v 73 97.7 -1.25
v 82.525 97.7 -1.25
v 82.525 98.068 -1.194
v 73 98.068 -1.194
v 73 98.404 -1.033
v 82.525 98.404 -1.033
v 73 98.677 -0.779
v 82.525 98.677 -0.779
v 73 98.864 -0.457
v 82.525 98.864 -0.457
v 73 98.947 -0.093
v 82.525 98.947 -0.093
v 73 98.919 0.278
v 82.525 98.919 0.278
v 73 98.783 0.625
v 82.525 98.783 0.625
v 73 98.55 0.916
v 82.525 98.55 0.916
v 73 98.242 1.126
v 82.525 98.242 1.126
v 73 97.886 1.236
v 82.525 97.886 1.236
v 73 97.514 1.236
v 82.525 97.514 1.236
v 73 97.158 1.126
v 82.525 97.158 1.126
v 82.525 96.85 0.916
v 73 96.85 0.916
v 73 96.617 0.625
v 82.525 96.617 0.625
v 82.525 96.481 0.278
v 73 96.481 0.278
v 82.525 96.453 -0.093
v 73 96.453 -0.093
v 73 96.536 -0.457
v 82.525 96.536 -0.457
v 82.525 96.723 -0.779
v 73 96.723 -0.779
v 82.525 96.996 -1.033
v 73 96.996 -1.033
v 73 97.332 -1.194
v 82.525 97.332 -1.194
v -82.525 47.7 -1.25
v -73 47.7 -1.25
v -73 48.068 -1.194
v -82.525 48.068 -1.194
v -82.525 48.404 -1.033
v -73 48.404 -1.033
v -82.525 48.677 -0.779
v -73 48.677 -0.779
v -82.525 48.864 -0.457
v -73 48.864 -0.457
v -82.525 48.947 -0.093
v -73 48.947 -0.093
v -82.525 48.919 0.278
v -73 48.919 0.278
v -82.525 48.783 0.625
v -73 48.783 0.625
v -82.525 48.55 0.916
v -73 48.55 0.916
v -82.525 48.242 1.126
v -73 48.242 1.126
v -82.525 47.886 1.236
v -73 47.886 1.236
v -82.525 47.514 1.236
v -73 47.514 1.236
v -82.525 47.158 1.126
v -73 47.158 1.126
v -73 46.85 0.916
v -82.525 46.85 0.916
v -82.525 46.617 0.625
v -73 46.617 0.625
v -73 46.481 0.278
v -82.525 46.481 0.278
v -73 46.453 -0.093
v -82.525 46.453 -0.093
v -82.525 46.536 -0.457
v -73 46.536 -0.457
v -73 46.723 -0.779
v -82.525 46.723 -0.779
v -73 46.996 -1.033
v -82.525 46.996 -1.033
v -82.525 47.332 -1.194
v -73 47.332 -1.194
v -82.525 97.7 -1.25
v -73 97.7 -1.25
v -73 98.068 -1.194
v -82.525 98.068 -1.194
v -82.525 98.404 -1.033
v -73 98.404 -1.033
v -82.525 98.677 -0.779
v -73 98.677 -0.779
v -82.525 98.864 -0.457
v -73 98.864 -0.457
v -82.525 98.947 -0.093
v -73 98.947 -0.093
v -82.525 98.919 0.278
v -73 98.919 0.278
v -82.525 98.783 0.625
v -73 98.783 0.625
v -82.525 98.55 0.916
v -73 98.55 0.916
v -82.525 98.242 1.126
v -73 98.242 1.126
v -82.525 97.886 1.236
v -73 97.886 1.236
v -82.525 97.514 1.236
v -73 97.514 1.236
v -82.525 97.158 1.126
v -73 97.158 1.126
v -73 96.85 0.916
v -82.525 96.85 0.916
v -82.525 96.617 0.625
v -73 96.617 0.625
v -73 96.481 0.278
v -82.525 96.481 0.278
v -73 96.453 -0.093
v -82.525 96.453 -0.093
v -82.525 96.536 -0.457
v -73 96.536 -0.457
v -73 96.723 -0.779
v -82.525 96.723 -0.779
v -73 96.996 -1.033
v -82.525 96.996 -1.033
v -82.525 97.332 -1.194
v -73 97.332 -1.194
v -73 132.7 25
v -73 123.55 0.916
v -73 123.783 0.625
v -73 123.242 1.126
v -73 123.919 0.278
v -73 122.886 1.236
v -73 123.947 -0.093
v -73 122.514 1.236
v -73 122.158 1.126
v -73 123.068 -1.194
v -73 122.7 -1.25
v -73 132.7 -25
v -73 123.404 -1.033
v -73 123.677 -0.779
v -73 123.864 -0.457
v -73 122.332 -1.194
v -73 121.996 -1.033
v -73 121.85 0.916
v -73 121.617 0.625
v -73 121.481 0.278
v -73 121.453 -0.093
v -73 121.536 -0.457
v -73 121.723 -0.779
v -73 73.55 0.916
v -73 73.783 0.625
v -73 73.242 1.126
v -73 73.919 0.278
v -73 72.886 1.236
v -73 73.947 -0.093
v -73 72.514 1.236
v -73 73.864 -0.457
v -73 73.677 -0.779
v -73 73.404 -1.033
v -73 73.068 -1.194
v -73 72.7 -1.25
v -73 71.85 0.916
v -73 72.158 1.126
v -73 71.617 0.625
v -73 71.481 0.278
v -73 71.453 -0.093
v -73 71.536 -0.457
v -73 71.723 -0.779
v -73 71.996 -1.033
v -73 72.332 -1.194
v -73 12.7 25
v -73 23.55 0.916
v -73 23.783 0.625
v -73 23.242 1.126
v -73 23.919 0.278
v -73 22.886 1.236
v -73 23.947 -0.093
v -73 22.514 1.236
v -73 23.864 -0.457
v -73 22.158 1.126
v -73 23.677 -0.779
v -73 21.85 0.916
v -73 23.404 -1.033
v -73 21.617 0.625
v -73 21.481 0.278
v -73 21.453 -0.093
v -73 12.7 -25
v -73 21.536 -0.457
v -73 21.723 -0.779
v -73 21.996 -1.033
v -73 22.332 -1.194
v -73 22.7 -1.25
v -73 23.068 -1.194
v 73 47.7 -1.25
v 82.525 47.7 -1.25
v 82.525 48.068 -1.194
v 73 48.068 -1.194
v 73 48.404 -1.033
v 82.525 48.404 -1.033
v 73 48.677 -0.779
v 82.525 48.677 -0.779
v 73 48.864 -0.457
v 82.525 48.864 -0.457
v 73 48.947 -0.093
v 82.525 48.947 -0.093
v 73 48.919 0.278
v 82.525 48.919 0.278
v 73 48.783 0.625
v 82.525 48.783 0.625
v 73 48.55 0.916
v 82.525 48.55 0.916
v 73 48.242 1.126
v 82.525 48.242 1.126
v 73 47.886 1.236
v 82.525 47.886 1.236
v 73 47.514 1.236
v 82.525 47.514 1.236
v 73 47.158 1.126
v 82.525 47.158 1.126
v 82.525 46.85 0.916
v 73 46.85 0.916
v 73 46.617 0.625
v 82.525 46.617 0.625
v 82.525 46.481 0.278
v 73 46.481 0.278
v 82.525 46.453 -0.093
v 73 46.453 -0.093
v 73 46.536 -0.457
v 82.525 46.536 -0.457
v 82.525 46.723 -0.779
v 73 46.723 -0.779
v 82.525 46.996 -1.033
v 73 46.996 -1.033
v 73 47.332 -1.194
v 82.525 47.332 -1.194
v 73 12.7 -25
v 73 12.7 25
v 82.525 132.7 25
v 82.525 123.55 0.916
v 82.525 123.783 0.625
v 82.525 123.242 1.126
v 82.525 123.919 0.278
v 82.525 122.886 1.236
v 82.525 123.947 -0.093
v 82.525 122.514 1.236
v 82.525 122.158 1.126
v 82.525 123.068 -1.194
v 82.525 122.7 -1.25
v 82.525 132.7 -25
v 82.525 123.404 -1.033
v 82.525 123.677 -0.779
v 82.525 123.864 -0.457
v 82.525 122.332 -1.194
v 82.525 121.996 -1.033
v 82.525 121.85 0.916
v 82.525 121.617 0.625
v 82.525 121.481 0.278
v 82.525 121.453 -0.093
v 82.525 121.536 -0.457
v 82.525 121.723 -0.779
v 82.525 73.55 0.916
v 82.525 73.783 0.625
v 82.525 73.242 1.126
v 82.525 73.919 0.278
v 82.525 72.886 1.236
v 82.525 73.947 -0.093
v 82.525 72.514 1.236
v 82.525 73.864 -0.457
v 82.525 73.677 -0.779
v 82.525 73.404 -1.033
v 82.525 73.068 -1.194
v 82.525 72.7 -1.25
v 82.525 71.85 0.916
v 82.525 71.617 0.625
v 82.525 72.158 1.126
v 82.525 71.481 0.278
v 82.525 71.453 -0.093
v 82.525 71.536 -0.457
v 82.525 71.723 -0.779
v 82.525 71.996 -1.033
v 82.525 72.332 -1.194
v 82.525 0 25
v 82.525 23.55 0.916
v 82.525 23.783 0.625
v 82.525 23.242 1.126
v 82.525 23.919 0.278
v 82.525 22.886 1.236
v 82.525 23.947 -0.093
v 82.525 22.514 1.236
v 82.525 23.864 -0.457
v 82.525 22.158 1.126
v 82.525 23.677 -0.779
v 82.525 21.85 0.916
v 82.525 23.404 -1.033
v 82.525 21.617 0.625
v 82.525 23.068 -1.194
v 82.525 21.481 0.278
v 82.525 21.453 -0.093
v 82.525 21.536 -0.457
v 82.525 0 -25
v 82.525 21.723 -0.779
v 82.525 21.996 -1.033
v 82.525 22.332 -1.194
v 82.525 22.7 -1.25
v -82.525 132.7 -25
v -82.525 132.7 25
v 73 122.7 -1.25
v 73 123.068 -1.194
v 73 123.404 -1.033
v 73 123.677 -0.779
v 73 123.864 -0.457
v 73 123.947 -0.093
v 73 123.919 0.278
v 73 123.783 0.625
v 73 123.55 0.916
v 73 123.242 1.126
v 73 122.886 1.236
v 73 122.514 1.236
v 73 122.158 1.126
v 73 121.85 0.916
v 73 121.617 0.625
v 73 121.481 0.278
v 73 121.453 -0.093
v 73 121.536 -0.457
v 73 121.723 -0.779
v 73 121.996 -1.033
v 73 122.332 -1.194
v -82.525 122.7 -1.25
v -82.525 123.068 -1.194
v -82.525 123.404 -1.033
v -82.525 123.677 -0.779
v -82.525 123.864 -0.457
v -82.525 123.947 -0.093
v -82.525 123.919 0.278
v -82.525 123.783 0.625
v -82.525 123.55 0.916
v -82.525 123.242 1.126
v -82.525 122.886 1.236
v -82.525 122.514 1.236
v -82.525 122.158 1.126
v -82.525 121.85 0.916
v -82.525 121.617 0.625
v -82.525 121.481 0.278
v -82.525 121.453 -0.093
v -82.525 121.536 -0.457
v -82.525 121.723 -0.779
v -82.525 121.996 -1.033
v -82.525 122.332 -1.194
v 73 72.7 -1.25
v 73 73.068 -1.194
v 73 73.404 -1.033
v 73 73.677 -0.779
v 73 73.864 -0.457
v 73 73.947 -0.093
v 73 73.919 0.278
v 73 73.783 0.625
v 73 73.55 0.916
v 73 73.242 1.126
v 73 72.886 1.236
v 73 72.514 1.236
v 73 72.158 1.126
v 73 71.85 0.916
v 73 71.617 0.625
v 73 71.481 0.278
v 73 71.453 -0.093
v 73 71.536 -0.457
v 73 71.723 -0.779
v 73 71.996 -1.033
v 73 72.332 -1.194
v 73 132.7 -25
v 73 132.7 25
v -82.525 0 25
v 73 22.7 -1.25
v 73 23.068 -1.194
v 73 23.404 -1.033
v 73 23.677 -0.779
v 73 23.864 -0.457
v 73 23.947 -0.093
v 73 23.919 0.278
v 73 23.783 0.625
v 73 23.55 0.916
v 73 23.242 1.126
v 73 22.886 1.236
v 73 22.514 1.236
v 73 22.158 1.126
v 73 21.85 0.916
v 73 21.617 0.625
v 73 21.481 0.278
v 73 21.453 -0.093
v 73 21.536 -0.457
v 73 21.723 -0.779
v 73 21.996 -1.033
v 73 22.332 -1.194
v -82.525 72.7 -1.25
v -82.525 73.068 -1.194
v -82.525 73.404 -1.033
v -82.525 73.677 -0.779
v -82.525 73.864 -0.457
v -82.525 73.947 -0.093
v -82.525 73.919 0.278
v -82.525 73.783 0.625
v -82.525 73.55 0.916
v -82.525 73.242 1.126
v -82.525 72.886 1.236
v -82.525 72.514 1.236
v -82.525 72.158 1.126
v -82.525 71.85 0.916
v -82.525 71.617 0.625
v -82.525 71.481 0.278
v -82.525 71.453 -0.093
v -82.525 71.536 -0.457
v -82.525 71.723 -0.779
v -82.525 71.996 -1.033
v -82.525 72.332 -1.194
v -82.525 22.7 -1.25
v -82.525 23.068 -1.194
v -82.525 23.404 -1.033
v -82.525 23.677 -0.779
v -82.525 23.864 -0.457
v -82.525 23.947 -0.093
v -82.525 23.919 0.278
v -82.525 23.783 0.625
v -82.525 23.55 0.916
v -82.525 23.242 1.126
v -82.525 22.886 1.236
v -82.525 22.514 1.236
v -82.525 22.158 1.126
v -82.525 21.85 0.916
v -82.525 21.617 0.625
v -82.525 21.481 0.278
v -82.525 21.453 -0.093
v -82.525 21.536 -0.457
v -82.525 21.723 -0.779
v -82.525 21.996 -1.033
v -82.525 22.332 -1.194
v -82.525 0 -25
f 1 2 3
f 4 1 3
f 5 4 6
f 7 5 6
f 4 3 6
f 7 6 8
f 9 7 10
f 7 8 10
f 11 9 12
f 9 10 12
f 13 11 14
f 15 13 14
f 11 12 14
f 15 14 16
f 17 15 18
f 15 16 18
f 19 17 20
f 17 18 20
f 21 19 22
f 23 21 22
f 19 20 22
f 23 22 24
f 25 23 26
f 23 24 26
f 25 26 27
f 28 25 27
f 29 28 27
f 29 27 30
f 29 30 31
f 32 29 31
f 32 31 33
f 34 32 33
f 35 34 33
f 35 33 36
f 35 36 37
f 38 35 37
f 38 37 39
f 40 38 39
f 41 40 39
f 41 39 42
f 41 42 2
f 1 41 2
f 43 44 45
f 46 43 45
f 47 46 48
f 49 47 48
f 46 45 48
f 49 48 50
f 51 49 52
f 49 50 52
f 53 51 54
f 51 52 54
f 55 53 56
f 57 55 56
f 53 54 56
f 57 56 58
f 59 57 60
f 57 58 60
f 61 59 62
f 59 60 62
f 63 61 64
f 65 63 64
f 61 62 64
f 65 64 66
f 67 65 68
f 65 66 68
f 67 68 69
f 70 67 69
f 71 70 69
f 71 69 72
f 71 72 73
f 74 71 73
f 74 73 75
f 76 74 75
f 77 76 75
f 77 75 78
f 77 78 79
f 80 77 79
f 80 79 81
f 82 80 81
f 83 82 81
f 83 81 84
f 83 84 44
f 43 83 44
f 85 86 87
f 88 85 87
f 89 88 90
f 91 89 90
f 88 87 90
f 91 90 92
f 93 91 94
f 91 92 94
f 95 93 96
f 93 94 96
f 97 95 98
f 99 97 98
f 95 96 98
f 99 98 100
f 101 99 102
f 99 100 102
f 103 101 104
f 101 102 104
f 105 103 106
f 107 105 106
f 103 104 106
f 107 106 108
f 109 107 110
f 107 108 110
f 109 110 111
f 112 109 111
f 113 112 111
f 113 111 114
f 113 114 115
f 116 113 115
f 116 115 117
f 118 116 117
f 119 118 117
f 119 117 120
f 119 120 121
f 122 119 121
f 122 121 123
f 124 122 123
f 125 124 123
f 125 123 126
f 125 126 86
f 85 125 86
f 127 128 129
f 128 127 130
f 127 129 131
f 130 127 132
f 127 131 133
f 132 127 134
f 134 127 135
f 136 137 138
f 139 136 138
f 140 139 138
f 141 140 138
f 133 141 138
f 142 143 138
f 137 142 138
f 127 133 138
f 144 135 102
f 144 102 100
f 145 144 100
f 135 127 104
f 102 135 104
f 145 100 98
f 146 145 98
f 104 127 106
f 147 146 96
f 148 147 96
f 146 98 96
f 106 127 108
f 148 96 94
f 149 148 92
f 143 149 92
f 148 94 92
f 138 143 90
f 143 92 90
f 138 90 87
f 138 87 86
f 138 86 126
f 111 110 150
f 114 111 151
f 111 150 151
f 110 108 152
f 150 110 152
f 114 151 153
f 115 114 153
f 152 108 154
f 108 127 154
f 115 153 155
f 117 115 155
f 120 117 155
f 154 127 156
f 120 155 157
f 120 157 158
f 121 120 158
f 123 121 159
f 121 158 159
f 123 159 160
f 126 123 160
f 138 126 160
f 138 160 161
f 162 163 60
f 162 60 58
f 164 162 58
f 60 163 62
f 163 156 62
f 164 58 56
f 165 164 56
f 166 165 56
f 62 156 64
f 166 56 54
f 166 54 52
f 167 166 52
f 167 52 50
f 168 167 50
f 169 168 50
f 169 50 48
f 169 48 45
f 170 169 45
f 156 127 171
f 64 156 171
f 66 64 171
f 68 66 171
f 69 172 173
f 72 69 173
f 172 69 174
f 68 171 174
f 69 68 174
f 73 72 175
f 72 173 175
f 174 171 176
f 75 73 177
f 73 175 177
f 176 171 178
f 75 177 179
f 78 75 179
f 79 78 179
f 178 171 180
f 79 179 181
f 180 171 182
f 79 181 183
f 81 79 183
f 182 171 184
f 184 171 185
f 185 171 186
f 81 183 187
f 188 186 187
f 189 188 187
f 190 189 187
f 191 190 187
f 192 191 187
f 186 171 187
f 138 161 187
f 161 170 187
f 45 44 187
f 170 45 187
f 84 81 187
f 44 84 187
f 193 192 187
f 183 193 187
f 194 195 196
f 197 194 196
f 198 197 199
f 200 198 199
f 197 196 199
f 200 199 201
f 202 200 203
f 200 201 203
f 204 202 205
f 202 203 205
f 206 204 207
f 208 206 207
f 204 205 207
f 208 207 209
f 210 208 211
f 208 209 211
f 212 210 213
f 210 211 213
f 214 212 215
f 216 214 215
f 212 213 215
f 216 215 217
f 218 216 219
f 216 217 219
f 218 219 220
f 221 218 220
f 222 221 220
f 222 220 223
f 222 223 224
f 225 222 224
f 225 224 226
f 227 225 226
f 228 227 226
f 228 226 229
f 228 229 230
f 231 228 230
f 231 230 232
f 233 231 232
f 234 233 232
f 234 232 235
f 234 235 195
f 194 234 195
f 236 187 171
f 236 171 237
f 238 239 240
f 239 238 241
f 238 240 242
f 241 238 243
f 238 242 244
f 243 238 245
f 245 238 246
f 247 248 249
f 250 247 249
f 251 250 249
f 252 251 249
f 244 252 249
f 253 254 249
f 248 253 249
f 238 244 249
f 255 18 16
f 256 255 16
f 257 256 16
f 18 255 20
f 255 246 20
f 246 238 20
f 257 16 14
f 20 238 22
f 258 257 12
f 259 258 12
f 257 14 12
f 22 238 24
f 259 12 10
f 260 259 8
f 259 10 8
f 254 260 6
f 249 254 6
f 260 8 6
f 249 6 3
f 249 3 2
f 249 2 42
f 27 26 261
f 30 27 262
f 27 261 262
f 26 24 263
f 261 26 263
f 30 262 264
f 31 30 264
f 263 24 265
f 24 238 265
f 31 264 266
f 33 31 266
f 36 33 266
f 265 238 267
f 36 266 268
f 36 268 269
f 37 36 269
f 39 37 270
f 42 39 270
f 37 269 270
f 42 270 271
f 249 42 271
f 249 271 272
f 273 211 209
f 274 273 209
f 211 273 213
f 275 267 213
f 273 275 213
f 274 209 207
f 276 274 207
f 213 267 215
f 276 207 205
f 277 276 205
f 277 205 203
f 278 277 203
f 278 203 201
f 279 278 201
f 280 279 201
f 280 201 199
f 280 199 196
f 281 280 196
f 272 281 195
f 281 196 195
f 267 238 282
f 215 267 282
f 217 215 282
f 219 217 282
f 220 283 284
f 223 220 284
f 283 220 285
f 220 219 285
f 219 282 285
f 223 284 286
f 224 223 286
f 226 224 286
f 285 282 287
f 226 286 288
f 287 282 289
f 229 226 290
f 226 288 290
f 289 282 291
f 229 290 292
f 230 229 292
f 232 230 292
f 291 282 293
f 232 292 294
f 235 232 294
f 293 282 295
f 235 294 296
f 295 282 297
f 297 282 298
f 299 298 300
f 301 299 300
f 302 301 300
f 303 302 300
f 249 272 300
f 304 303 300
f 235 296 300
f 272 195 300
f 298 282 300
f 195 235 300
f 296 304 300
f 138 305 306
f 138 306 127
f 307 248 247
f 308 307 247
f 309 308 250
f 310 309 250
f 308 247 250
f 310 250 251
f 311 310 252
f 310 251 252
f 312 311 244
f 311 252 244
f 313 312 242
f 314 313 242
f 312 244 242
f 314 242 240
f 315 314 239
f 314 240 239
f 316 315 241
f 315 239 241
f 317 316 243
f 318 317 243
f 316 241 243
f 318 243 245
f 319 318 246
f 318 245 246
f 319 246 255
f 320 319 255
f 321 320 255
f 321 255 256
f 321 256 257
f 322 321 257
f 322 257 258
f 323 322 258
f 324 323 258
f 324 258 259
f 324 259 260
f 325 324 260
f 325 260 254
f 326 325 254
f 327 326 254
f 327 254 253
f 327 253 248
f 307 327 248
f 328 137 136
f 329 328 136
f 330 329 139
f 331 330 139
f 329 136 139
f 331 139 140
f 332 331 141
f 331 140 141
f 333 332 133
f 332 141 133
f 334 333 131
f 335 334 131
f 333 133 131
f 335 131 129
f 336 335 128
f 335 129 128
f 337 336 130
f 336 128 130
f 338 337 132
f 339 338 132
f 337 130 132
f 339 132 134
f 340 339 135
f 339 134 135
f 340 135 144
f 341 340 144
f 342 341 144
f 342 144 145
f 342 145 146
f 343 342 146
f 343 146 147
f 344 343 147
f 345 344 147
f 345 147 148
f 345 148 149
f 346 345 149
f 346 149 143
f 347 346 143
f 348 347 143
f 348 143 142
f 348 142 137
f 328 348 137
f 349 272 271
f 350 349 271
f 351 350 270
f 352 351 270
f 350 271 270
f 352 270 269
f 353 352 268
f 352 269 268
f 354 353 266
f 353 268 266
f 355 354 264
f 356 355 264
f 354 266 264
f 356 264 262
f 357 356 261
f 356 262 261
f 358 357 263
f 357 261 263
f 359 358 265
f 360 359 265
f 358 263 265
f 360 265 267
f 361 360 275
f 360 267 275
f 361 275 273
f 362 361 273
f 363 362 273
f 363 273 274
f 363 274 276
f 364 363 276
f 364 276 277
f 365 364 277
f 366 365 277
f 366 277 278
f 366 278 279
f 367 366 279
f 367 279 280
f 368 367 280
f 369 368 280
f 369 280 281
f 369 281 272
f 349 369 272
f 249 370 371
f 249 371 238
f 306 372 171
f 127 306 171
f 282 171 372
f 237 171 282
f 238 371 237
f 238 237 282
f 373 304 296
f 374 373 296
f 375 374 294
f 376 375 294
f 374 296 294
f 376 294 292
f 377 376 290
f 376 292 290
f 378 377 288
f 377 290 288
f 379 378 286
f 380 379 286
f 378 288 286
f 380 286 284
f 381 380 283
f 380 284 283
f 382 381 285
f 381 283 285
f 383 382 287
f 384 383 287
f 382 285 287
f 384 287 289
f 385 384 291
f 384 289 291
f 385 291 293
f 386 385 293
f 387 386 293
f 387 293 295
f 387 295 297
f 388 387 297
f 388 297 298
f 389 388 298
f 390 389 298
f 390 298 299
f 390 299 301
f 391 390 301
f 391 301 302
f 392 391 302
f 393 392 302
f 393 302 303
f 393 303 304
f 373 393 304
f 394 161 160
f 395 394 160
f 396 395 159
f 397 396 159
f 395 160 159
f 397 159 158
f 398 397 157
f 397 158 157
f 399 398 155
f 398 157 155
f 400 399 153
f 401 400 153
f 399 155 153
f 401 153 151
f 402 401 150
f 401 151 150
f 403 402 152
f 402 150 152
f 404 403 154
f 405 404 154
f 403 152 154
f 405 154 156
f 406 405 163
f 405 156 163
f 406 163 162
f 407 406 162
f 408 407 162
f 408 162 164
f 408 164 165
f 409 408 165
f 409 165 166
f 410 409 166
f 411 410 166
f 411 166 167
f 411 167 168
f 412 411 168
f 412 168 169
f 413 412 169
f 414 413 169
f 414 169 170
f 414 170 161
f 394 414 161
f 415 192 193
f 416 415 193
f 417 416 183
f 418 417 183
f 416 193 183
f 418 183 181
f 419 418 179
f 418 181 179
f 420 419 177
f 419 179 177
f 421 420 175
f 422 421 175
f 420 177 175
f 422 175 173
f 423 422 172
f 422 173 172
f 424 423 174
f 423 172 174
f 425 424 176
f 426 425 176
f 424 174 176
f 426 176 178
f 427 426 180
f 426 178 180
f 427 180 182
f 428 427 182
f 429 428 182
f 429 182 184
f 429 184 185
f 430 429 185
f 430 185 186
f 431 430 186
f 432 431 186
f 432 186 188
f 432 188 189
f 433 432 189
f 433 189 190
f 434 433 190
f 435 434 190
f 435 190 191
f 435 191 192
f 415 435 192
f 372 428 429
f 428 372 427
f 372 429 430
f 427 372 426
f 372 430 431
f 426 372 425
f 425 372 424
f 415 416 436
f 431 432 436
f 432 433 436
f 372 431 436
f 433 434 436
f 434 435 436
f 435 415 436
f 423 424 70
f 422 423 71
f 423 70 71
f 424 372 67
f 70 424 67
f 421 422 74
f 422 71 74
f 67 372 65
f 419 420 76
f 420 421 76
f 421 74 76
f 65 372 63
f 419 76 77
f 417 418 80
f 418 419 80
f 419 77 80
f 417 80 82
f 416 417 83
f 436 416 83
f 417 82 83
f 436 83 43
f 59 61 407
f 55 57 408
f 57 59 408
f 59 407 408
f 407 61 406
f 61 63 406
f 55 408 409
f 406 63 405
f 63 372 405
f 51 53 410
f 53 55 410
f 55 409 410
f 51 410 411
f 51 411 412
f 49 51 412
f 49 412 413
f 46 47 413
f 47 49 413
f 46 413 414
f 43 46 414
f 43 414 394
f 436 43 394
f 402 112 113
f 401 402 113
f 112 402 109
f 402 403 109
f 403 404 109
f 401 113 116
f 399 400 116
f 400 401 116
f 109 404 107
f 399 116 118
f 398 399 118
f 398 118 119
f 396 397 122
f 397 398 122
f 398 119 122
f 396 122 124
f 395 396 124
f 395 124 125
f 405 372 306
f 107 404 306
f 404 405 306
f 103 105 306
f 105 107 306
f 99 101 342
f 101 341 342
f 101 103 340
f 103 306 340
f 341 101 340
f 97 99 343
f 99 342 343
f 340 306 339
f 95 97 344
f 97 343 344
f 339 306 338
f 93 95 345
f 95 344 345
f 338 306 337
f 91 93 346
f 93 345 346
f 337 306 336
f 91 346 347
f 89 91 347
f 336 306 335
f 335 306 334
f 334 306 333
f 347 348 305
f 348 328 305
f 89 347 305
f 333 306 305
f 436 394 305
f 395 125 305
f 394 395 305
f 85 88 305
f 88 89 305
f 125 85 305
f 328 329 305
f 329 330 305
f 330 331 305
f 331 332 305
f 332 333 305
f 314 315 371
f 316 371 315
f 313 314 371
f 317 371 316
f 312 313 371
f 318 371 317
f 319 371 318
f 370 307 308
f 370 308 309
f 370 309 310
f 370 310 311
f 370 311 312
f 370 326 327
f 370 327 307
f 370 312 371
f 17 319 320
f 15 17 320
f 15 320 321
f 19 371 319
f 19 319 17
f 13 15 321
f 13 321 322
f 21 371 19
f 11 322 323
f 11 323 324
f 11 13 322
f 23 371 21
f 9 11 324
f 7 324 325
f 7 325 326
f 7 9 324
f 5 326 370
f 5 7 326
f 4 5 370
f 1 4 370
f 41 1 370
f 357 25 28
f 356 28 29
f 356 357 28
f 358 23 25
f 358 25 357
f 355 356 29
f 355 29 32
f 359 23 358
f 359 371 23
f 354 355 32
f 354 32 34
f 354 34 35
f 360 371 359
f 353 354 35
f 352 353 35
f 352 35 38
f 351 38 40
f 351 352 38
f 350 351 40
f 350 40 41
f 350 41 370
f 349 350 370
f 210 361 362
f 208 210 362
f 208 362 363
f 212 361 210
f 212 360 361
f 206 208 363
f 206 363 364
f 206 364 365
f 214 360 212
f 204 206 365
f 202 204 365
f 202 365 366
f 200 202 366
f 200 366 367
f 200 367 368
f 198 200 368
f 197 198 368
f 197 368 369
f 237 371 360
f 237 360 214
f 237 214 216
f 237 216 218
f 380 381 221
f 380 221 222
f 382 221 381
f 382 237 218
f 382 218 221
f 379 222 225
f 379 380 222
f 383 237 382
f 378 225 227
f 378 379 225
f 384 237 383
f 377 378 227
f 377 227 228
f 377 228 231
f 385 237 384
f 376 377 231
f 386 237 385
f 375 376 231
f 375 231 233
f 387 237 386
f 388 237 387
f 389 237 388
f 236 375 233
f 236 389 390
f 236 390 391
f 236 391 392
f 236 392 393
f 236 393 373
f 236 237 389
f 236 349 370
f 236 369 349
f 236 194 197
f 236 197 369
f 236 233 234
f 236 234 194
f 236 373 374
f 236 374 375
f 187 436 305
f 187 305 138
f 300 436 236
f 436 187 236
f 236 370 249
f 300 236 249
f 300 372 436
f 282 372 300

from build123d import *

# Parameters (mm, degrees)
SKETCH1_W                       = 156
SKETCH1_H                       = 50
BOSS_EXTRUDE1_DEPTH             = 12.7
SKETCH2_W                       = 9.525
SKETCH2_H                       = 50
BOSS_EXTRUDE2_DEPTH             = 120
BOSS_EXTRUDE2_DIRECTION_2_REACH = 84.887
SKETCH3_R                       = 1.25
CUT_EXTRUDE1_DEPTH              = 214.250539272


with BuildPart() as part:
    # Sketch1 → Boss-Extrude1 (new body)
    with BuildSketch(Plane(origin=(0, 0, 0), x_dir=(1, 0, 0), z_dir=(0, 1, 0))):
        Rectangle(SKETCH1_W, SKETCH1_H)
    extrude(amount=BOSS_EXTRUDE1_DEPTH)

    # Sketch2 → Boss-Extrude2 (add)
    with BuildSketch(Plane(origin=(0, 12.7, 0), x_dir=(1, 0, 0), z_dir=(0, 1, 0))):
        with Locations((-77.7625, 0)):
            Rectangle(SKETCH2_W, SKETCH2_H)
        with Locations((77.7625, 0)):
            Rectangle(SKETCH2_W, SKETCH2_H)
    extrude(amount=BOSS_EXTRUDE2_DEPTH)

    # Boss-Extrude2 direction 2: up to this face of the body (flat: up to its plane)
    boss_extrude2_direction_2_end = Plane(part.part.faces().sort_by_distance((0, 0, 0))[0])
    # Sketch2 → Boss-Extrude2 direction 2 (add, up to the picked face)
    with BuildSketch(Plane(origin=(0, 12.7, 0), x_dir=(1, 0, 0), z_dir=(0, 1, 0)), mode=Mode.PRIVATE) as boss_extrude2_direction_2_sk1:
        with Locations((-77.7625, 0)):
            Rectangle(SKETCH2_W, SKETCH2_H)
    boss_extrude2_direction_2_tool1 = split(extrude(boss_extrude2_direction_2_sk1.sketch, amount=-BOSS_EXTRUDE2_DIRECTION_2_REACH, mode=Mode.PRIVATE), bisect_by=boss_extrude2_direction_2_end, keep=Keep.BOTH, mode=Mode.PRIVATE)
    # Sketch2 → Boss-Extrude2 direction 2 (add, up to the picked face)
    with BuildSketch(Plane(origin=(0, 12.7, 0), x_dir=(1, 0, 0), z_dir=(0, 1, 0)), mode=Mode.PRIVATE) as boss_extrude2_direction_2_sk2:
        with Locations((77.7625, 0)):
            Rectangle(SKETCH2_W, SKETCH2_H)
    boss_extrude2_direction_2_tool2 = split(extrude(boss_extrude2_direction_2_sk2.sketch, amount=-BOSS_EXTRUDE2_DIRECTION_2_REACH, mode=Mode.PRIVATE), bisect_by=boss_extrude2_direction_2_end, keep=Keep.BOTH, mode=Mode.PRIVATE)
    add(boss_extrude2_direction_2_tool1.solids().sort_by(Axis((-77.7625, 12.7, 0), (0, -1, 0)))[0])
    add(boss_extrude2_direction_2_tool2.solids().sort_by(Axis((77.7625, 12.7, 0), (0, -1, 0)))[0])

    # Sketch3 → Cut-Extrude1 (cut, through all)
    with BuildSketch(Plane(origin=(82.525, 0, 0), x_dir=(0, 0, -1), z_dir=(1, 0, 0))):
        with Locations((0, 122.7)):
            Circle(SKETCH3_R)
        with Locations((0, 97.7)):
            Circle(SKETCH3_R)
        with Locations((0, 72.7)):
            Circle(SKETCH3_R)
        with Locations((0, 47.7)):
            Circle(SKETCH3_R)
        with Locations((0, 22.7)):
            Circle(SKETCH3_R)
    extrude(amount=-CUT_EXTRUDE1_DEPTH, mode=Mode.SUBTRACT)


solid = part.part
